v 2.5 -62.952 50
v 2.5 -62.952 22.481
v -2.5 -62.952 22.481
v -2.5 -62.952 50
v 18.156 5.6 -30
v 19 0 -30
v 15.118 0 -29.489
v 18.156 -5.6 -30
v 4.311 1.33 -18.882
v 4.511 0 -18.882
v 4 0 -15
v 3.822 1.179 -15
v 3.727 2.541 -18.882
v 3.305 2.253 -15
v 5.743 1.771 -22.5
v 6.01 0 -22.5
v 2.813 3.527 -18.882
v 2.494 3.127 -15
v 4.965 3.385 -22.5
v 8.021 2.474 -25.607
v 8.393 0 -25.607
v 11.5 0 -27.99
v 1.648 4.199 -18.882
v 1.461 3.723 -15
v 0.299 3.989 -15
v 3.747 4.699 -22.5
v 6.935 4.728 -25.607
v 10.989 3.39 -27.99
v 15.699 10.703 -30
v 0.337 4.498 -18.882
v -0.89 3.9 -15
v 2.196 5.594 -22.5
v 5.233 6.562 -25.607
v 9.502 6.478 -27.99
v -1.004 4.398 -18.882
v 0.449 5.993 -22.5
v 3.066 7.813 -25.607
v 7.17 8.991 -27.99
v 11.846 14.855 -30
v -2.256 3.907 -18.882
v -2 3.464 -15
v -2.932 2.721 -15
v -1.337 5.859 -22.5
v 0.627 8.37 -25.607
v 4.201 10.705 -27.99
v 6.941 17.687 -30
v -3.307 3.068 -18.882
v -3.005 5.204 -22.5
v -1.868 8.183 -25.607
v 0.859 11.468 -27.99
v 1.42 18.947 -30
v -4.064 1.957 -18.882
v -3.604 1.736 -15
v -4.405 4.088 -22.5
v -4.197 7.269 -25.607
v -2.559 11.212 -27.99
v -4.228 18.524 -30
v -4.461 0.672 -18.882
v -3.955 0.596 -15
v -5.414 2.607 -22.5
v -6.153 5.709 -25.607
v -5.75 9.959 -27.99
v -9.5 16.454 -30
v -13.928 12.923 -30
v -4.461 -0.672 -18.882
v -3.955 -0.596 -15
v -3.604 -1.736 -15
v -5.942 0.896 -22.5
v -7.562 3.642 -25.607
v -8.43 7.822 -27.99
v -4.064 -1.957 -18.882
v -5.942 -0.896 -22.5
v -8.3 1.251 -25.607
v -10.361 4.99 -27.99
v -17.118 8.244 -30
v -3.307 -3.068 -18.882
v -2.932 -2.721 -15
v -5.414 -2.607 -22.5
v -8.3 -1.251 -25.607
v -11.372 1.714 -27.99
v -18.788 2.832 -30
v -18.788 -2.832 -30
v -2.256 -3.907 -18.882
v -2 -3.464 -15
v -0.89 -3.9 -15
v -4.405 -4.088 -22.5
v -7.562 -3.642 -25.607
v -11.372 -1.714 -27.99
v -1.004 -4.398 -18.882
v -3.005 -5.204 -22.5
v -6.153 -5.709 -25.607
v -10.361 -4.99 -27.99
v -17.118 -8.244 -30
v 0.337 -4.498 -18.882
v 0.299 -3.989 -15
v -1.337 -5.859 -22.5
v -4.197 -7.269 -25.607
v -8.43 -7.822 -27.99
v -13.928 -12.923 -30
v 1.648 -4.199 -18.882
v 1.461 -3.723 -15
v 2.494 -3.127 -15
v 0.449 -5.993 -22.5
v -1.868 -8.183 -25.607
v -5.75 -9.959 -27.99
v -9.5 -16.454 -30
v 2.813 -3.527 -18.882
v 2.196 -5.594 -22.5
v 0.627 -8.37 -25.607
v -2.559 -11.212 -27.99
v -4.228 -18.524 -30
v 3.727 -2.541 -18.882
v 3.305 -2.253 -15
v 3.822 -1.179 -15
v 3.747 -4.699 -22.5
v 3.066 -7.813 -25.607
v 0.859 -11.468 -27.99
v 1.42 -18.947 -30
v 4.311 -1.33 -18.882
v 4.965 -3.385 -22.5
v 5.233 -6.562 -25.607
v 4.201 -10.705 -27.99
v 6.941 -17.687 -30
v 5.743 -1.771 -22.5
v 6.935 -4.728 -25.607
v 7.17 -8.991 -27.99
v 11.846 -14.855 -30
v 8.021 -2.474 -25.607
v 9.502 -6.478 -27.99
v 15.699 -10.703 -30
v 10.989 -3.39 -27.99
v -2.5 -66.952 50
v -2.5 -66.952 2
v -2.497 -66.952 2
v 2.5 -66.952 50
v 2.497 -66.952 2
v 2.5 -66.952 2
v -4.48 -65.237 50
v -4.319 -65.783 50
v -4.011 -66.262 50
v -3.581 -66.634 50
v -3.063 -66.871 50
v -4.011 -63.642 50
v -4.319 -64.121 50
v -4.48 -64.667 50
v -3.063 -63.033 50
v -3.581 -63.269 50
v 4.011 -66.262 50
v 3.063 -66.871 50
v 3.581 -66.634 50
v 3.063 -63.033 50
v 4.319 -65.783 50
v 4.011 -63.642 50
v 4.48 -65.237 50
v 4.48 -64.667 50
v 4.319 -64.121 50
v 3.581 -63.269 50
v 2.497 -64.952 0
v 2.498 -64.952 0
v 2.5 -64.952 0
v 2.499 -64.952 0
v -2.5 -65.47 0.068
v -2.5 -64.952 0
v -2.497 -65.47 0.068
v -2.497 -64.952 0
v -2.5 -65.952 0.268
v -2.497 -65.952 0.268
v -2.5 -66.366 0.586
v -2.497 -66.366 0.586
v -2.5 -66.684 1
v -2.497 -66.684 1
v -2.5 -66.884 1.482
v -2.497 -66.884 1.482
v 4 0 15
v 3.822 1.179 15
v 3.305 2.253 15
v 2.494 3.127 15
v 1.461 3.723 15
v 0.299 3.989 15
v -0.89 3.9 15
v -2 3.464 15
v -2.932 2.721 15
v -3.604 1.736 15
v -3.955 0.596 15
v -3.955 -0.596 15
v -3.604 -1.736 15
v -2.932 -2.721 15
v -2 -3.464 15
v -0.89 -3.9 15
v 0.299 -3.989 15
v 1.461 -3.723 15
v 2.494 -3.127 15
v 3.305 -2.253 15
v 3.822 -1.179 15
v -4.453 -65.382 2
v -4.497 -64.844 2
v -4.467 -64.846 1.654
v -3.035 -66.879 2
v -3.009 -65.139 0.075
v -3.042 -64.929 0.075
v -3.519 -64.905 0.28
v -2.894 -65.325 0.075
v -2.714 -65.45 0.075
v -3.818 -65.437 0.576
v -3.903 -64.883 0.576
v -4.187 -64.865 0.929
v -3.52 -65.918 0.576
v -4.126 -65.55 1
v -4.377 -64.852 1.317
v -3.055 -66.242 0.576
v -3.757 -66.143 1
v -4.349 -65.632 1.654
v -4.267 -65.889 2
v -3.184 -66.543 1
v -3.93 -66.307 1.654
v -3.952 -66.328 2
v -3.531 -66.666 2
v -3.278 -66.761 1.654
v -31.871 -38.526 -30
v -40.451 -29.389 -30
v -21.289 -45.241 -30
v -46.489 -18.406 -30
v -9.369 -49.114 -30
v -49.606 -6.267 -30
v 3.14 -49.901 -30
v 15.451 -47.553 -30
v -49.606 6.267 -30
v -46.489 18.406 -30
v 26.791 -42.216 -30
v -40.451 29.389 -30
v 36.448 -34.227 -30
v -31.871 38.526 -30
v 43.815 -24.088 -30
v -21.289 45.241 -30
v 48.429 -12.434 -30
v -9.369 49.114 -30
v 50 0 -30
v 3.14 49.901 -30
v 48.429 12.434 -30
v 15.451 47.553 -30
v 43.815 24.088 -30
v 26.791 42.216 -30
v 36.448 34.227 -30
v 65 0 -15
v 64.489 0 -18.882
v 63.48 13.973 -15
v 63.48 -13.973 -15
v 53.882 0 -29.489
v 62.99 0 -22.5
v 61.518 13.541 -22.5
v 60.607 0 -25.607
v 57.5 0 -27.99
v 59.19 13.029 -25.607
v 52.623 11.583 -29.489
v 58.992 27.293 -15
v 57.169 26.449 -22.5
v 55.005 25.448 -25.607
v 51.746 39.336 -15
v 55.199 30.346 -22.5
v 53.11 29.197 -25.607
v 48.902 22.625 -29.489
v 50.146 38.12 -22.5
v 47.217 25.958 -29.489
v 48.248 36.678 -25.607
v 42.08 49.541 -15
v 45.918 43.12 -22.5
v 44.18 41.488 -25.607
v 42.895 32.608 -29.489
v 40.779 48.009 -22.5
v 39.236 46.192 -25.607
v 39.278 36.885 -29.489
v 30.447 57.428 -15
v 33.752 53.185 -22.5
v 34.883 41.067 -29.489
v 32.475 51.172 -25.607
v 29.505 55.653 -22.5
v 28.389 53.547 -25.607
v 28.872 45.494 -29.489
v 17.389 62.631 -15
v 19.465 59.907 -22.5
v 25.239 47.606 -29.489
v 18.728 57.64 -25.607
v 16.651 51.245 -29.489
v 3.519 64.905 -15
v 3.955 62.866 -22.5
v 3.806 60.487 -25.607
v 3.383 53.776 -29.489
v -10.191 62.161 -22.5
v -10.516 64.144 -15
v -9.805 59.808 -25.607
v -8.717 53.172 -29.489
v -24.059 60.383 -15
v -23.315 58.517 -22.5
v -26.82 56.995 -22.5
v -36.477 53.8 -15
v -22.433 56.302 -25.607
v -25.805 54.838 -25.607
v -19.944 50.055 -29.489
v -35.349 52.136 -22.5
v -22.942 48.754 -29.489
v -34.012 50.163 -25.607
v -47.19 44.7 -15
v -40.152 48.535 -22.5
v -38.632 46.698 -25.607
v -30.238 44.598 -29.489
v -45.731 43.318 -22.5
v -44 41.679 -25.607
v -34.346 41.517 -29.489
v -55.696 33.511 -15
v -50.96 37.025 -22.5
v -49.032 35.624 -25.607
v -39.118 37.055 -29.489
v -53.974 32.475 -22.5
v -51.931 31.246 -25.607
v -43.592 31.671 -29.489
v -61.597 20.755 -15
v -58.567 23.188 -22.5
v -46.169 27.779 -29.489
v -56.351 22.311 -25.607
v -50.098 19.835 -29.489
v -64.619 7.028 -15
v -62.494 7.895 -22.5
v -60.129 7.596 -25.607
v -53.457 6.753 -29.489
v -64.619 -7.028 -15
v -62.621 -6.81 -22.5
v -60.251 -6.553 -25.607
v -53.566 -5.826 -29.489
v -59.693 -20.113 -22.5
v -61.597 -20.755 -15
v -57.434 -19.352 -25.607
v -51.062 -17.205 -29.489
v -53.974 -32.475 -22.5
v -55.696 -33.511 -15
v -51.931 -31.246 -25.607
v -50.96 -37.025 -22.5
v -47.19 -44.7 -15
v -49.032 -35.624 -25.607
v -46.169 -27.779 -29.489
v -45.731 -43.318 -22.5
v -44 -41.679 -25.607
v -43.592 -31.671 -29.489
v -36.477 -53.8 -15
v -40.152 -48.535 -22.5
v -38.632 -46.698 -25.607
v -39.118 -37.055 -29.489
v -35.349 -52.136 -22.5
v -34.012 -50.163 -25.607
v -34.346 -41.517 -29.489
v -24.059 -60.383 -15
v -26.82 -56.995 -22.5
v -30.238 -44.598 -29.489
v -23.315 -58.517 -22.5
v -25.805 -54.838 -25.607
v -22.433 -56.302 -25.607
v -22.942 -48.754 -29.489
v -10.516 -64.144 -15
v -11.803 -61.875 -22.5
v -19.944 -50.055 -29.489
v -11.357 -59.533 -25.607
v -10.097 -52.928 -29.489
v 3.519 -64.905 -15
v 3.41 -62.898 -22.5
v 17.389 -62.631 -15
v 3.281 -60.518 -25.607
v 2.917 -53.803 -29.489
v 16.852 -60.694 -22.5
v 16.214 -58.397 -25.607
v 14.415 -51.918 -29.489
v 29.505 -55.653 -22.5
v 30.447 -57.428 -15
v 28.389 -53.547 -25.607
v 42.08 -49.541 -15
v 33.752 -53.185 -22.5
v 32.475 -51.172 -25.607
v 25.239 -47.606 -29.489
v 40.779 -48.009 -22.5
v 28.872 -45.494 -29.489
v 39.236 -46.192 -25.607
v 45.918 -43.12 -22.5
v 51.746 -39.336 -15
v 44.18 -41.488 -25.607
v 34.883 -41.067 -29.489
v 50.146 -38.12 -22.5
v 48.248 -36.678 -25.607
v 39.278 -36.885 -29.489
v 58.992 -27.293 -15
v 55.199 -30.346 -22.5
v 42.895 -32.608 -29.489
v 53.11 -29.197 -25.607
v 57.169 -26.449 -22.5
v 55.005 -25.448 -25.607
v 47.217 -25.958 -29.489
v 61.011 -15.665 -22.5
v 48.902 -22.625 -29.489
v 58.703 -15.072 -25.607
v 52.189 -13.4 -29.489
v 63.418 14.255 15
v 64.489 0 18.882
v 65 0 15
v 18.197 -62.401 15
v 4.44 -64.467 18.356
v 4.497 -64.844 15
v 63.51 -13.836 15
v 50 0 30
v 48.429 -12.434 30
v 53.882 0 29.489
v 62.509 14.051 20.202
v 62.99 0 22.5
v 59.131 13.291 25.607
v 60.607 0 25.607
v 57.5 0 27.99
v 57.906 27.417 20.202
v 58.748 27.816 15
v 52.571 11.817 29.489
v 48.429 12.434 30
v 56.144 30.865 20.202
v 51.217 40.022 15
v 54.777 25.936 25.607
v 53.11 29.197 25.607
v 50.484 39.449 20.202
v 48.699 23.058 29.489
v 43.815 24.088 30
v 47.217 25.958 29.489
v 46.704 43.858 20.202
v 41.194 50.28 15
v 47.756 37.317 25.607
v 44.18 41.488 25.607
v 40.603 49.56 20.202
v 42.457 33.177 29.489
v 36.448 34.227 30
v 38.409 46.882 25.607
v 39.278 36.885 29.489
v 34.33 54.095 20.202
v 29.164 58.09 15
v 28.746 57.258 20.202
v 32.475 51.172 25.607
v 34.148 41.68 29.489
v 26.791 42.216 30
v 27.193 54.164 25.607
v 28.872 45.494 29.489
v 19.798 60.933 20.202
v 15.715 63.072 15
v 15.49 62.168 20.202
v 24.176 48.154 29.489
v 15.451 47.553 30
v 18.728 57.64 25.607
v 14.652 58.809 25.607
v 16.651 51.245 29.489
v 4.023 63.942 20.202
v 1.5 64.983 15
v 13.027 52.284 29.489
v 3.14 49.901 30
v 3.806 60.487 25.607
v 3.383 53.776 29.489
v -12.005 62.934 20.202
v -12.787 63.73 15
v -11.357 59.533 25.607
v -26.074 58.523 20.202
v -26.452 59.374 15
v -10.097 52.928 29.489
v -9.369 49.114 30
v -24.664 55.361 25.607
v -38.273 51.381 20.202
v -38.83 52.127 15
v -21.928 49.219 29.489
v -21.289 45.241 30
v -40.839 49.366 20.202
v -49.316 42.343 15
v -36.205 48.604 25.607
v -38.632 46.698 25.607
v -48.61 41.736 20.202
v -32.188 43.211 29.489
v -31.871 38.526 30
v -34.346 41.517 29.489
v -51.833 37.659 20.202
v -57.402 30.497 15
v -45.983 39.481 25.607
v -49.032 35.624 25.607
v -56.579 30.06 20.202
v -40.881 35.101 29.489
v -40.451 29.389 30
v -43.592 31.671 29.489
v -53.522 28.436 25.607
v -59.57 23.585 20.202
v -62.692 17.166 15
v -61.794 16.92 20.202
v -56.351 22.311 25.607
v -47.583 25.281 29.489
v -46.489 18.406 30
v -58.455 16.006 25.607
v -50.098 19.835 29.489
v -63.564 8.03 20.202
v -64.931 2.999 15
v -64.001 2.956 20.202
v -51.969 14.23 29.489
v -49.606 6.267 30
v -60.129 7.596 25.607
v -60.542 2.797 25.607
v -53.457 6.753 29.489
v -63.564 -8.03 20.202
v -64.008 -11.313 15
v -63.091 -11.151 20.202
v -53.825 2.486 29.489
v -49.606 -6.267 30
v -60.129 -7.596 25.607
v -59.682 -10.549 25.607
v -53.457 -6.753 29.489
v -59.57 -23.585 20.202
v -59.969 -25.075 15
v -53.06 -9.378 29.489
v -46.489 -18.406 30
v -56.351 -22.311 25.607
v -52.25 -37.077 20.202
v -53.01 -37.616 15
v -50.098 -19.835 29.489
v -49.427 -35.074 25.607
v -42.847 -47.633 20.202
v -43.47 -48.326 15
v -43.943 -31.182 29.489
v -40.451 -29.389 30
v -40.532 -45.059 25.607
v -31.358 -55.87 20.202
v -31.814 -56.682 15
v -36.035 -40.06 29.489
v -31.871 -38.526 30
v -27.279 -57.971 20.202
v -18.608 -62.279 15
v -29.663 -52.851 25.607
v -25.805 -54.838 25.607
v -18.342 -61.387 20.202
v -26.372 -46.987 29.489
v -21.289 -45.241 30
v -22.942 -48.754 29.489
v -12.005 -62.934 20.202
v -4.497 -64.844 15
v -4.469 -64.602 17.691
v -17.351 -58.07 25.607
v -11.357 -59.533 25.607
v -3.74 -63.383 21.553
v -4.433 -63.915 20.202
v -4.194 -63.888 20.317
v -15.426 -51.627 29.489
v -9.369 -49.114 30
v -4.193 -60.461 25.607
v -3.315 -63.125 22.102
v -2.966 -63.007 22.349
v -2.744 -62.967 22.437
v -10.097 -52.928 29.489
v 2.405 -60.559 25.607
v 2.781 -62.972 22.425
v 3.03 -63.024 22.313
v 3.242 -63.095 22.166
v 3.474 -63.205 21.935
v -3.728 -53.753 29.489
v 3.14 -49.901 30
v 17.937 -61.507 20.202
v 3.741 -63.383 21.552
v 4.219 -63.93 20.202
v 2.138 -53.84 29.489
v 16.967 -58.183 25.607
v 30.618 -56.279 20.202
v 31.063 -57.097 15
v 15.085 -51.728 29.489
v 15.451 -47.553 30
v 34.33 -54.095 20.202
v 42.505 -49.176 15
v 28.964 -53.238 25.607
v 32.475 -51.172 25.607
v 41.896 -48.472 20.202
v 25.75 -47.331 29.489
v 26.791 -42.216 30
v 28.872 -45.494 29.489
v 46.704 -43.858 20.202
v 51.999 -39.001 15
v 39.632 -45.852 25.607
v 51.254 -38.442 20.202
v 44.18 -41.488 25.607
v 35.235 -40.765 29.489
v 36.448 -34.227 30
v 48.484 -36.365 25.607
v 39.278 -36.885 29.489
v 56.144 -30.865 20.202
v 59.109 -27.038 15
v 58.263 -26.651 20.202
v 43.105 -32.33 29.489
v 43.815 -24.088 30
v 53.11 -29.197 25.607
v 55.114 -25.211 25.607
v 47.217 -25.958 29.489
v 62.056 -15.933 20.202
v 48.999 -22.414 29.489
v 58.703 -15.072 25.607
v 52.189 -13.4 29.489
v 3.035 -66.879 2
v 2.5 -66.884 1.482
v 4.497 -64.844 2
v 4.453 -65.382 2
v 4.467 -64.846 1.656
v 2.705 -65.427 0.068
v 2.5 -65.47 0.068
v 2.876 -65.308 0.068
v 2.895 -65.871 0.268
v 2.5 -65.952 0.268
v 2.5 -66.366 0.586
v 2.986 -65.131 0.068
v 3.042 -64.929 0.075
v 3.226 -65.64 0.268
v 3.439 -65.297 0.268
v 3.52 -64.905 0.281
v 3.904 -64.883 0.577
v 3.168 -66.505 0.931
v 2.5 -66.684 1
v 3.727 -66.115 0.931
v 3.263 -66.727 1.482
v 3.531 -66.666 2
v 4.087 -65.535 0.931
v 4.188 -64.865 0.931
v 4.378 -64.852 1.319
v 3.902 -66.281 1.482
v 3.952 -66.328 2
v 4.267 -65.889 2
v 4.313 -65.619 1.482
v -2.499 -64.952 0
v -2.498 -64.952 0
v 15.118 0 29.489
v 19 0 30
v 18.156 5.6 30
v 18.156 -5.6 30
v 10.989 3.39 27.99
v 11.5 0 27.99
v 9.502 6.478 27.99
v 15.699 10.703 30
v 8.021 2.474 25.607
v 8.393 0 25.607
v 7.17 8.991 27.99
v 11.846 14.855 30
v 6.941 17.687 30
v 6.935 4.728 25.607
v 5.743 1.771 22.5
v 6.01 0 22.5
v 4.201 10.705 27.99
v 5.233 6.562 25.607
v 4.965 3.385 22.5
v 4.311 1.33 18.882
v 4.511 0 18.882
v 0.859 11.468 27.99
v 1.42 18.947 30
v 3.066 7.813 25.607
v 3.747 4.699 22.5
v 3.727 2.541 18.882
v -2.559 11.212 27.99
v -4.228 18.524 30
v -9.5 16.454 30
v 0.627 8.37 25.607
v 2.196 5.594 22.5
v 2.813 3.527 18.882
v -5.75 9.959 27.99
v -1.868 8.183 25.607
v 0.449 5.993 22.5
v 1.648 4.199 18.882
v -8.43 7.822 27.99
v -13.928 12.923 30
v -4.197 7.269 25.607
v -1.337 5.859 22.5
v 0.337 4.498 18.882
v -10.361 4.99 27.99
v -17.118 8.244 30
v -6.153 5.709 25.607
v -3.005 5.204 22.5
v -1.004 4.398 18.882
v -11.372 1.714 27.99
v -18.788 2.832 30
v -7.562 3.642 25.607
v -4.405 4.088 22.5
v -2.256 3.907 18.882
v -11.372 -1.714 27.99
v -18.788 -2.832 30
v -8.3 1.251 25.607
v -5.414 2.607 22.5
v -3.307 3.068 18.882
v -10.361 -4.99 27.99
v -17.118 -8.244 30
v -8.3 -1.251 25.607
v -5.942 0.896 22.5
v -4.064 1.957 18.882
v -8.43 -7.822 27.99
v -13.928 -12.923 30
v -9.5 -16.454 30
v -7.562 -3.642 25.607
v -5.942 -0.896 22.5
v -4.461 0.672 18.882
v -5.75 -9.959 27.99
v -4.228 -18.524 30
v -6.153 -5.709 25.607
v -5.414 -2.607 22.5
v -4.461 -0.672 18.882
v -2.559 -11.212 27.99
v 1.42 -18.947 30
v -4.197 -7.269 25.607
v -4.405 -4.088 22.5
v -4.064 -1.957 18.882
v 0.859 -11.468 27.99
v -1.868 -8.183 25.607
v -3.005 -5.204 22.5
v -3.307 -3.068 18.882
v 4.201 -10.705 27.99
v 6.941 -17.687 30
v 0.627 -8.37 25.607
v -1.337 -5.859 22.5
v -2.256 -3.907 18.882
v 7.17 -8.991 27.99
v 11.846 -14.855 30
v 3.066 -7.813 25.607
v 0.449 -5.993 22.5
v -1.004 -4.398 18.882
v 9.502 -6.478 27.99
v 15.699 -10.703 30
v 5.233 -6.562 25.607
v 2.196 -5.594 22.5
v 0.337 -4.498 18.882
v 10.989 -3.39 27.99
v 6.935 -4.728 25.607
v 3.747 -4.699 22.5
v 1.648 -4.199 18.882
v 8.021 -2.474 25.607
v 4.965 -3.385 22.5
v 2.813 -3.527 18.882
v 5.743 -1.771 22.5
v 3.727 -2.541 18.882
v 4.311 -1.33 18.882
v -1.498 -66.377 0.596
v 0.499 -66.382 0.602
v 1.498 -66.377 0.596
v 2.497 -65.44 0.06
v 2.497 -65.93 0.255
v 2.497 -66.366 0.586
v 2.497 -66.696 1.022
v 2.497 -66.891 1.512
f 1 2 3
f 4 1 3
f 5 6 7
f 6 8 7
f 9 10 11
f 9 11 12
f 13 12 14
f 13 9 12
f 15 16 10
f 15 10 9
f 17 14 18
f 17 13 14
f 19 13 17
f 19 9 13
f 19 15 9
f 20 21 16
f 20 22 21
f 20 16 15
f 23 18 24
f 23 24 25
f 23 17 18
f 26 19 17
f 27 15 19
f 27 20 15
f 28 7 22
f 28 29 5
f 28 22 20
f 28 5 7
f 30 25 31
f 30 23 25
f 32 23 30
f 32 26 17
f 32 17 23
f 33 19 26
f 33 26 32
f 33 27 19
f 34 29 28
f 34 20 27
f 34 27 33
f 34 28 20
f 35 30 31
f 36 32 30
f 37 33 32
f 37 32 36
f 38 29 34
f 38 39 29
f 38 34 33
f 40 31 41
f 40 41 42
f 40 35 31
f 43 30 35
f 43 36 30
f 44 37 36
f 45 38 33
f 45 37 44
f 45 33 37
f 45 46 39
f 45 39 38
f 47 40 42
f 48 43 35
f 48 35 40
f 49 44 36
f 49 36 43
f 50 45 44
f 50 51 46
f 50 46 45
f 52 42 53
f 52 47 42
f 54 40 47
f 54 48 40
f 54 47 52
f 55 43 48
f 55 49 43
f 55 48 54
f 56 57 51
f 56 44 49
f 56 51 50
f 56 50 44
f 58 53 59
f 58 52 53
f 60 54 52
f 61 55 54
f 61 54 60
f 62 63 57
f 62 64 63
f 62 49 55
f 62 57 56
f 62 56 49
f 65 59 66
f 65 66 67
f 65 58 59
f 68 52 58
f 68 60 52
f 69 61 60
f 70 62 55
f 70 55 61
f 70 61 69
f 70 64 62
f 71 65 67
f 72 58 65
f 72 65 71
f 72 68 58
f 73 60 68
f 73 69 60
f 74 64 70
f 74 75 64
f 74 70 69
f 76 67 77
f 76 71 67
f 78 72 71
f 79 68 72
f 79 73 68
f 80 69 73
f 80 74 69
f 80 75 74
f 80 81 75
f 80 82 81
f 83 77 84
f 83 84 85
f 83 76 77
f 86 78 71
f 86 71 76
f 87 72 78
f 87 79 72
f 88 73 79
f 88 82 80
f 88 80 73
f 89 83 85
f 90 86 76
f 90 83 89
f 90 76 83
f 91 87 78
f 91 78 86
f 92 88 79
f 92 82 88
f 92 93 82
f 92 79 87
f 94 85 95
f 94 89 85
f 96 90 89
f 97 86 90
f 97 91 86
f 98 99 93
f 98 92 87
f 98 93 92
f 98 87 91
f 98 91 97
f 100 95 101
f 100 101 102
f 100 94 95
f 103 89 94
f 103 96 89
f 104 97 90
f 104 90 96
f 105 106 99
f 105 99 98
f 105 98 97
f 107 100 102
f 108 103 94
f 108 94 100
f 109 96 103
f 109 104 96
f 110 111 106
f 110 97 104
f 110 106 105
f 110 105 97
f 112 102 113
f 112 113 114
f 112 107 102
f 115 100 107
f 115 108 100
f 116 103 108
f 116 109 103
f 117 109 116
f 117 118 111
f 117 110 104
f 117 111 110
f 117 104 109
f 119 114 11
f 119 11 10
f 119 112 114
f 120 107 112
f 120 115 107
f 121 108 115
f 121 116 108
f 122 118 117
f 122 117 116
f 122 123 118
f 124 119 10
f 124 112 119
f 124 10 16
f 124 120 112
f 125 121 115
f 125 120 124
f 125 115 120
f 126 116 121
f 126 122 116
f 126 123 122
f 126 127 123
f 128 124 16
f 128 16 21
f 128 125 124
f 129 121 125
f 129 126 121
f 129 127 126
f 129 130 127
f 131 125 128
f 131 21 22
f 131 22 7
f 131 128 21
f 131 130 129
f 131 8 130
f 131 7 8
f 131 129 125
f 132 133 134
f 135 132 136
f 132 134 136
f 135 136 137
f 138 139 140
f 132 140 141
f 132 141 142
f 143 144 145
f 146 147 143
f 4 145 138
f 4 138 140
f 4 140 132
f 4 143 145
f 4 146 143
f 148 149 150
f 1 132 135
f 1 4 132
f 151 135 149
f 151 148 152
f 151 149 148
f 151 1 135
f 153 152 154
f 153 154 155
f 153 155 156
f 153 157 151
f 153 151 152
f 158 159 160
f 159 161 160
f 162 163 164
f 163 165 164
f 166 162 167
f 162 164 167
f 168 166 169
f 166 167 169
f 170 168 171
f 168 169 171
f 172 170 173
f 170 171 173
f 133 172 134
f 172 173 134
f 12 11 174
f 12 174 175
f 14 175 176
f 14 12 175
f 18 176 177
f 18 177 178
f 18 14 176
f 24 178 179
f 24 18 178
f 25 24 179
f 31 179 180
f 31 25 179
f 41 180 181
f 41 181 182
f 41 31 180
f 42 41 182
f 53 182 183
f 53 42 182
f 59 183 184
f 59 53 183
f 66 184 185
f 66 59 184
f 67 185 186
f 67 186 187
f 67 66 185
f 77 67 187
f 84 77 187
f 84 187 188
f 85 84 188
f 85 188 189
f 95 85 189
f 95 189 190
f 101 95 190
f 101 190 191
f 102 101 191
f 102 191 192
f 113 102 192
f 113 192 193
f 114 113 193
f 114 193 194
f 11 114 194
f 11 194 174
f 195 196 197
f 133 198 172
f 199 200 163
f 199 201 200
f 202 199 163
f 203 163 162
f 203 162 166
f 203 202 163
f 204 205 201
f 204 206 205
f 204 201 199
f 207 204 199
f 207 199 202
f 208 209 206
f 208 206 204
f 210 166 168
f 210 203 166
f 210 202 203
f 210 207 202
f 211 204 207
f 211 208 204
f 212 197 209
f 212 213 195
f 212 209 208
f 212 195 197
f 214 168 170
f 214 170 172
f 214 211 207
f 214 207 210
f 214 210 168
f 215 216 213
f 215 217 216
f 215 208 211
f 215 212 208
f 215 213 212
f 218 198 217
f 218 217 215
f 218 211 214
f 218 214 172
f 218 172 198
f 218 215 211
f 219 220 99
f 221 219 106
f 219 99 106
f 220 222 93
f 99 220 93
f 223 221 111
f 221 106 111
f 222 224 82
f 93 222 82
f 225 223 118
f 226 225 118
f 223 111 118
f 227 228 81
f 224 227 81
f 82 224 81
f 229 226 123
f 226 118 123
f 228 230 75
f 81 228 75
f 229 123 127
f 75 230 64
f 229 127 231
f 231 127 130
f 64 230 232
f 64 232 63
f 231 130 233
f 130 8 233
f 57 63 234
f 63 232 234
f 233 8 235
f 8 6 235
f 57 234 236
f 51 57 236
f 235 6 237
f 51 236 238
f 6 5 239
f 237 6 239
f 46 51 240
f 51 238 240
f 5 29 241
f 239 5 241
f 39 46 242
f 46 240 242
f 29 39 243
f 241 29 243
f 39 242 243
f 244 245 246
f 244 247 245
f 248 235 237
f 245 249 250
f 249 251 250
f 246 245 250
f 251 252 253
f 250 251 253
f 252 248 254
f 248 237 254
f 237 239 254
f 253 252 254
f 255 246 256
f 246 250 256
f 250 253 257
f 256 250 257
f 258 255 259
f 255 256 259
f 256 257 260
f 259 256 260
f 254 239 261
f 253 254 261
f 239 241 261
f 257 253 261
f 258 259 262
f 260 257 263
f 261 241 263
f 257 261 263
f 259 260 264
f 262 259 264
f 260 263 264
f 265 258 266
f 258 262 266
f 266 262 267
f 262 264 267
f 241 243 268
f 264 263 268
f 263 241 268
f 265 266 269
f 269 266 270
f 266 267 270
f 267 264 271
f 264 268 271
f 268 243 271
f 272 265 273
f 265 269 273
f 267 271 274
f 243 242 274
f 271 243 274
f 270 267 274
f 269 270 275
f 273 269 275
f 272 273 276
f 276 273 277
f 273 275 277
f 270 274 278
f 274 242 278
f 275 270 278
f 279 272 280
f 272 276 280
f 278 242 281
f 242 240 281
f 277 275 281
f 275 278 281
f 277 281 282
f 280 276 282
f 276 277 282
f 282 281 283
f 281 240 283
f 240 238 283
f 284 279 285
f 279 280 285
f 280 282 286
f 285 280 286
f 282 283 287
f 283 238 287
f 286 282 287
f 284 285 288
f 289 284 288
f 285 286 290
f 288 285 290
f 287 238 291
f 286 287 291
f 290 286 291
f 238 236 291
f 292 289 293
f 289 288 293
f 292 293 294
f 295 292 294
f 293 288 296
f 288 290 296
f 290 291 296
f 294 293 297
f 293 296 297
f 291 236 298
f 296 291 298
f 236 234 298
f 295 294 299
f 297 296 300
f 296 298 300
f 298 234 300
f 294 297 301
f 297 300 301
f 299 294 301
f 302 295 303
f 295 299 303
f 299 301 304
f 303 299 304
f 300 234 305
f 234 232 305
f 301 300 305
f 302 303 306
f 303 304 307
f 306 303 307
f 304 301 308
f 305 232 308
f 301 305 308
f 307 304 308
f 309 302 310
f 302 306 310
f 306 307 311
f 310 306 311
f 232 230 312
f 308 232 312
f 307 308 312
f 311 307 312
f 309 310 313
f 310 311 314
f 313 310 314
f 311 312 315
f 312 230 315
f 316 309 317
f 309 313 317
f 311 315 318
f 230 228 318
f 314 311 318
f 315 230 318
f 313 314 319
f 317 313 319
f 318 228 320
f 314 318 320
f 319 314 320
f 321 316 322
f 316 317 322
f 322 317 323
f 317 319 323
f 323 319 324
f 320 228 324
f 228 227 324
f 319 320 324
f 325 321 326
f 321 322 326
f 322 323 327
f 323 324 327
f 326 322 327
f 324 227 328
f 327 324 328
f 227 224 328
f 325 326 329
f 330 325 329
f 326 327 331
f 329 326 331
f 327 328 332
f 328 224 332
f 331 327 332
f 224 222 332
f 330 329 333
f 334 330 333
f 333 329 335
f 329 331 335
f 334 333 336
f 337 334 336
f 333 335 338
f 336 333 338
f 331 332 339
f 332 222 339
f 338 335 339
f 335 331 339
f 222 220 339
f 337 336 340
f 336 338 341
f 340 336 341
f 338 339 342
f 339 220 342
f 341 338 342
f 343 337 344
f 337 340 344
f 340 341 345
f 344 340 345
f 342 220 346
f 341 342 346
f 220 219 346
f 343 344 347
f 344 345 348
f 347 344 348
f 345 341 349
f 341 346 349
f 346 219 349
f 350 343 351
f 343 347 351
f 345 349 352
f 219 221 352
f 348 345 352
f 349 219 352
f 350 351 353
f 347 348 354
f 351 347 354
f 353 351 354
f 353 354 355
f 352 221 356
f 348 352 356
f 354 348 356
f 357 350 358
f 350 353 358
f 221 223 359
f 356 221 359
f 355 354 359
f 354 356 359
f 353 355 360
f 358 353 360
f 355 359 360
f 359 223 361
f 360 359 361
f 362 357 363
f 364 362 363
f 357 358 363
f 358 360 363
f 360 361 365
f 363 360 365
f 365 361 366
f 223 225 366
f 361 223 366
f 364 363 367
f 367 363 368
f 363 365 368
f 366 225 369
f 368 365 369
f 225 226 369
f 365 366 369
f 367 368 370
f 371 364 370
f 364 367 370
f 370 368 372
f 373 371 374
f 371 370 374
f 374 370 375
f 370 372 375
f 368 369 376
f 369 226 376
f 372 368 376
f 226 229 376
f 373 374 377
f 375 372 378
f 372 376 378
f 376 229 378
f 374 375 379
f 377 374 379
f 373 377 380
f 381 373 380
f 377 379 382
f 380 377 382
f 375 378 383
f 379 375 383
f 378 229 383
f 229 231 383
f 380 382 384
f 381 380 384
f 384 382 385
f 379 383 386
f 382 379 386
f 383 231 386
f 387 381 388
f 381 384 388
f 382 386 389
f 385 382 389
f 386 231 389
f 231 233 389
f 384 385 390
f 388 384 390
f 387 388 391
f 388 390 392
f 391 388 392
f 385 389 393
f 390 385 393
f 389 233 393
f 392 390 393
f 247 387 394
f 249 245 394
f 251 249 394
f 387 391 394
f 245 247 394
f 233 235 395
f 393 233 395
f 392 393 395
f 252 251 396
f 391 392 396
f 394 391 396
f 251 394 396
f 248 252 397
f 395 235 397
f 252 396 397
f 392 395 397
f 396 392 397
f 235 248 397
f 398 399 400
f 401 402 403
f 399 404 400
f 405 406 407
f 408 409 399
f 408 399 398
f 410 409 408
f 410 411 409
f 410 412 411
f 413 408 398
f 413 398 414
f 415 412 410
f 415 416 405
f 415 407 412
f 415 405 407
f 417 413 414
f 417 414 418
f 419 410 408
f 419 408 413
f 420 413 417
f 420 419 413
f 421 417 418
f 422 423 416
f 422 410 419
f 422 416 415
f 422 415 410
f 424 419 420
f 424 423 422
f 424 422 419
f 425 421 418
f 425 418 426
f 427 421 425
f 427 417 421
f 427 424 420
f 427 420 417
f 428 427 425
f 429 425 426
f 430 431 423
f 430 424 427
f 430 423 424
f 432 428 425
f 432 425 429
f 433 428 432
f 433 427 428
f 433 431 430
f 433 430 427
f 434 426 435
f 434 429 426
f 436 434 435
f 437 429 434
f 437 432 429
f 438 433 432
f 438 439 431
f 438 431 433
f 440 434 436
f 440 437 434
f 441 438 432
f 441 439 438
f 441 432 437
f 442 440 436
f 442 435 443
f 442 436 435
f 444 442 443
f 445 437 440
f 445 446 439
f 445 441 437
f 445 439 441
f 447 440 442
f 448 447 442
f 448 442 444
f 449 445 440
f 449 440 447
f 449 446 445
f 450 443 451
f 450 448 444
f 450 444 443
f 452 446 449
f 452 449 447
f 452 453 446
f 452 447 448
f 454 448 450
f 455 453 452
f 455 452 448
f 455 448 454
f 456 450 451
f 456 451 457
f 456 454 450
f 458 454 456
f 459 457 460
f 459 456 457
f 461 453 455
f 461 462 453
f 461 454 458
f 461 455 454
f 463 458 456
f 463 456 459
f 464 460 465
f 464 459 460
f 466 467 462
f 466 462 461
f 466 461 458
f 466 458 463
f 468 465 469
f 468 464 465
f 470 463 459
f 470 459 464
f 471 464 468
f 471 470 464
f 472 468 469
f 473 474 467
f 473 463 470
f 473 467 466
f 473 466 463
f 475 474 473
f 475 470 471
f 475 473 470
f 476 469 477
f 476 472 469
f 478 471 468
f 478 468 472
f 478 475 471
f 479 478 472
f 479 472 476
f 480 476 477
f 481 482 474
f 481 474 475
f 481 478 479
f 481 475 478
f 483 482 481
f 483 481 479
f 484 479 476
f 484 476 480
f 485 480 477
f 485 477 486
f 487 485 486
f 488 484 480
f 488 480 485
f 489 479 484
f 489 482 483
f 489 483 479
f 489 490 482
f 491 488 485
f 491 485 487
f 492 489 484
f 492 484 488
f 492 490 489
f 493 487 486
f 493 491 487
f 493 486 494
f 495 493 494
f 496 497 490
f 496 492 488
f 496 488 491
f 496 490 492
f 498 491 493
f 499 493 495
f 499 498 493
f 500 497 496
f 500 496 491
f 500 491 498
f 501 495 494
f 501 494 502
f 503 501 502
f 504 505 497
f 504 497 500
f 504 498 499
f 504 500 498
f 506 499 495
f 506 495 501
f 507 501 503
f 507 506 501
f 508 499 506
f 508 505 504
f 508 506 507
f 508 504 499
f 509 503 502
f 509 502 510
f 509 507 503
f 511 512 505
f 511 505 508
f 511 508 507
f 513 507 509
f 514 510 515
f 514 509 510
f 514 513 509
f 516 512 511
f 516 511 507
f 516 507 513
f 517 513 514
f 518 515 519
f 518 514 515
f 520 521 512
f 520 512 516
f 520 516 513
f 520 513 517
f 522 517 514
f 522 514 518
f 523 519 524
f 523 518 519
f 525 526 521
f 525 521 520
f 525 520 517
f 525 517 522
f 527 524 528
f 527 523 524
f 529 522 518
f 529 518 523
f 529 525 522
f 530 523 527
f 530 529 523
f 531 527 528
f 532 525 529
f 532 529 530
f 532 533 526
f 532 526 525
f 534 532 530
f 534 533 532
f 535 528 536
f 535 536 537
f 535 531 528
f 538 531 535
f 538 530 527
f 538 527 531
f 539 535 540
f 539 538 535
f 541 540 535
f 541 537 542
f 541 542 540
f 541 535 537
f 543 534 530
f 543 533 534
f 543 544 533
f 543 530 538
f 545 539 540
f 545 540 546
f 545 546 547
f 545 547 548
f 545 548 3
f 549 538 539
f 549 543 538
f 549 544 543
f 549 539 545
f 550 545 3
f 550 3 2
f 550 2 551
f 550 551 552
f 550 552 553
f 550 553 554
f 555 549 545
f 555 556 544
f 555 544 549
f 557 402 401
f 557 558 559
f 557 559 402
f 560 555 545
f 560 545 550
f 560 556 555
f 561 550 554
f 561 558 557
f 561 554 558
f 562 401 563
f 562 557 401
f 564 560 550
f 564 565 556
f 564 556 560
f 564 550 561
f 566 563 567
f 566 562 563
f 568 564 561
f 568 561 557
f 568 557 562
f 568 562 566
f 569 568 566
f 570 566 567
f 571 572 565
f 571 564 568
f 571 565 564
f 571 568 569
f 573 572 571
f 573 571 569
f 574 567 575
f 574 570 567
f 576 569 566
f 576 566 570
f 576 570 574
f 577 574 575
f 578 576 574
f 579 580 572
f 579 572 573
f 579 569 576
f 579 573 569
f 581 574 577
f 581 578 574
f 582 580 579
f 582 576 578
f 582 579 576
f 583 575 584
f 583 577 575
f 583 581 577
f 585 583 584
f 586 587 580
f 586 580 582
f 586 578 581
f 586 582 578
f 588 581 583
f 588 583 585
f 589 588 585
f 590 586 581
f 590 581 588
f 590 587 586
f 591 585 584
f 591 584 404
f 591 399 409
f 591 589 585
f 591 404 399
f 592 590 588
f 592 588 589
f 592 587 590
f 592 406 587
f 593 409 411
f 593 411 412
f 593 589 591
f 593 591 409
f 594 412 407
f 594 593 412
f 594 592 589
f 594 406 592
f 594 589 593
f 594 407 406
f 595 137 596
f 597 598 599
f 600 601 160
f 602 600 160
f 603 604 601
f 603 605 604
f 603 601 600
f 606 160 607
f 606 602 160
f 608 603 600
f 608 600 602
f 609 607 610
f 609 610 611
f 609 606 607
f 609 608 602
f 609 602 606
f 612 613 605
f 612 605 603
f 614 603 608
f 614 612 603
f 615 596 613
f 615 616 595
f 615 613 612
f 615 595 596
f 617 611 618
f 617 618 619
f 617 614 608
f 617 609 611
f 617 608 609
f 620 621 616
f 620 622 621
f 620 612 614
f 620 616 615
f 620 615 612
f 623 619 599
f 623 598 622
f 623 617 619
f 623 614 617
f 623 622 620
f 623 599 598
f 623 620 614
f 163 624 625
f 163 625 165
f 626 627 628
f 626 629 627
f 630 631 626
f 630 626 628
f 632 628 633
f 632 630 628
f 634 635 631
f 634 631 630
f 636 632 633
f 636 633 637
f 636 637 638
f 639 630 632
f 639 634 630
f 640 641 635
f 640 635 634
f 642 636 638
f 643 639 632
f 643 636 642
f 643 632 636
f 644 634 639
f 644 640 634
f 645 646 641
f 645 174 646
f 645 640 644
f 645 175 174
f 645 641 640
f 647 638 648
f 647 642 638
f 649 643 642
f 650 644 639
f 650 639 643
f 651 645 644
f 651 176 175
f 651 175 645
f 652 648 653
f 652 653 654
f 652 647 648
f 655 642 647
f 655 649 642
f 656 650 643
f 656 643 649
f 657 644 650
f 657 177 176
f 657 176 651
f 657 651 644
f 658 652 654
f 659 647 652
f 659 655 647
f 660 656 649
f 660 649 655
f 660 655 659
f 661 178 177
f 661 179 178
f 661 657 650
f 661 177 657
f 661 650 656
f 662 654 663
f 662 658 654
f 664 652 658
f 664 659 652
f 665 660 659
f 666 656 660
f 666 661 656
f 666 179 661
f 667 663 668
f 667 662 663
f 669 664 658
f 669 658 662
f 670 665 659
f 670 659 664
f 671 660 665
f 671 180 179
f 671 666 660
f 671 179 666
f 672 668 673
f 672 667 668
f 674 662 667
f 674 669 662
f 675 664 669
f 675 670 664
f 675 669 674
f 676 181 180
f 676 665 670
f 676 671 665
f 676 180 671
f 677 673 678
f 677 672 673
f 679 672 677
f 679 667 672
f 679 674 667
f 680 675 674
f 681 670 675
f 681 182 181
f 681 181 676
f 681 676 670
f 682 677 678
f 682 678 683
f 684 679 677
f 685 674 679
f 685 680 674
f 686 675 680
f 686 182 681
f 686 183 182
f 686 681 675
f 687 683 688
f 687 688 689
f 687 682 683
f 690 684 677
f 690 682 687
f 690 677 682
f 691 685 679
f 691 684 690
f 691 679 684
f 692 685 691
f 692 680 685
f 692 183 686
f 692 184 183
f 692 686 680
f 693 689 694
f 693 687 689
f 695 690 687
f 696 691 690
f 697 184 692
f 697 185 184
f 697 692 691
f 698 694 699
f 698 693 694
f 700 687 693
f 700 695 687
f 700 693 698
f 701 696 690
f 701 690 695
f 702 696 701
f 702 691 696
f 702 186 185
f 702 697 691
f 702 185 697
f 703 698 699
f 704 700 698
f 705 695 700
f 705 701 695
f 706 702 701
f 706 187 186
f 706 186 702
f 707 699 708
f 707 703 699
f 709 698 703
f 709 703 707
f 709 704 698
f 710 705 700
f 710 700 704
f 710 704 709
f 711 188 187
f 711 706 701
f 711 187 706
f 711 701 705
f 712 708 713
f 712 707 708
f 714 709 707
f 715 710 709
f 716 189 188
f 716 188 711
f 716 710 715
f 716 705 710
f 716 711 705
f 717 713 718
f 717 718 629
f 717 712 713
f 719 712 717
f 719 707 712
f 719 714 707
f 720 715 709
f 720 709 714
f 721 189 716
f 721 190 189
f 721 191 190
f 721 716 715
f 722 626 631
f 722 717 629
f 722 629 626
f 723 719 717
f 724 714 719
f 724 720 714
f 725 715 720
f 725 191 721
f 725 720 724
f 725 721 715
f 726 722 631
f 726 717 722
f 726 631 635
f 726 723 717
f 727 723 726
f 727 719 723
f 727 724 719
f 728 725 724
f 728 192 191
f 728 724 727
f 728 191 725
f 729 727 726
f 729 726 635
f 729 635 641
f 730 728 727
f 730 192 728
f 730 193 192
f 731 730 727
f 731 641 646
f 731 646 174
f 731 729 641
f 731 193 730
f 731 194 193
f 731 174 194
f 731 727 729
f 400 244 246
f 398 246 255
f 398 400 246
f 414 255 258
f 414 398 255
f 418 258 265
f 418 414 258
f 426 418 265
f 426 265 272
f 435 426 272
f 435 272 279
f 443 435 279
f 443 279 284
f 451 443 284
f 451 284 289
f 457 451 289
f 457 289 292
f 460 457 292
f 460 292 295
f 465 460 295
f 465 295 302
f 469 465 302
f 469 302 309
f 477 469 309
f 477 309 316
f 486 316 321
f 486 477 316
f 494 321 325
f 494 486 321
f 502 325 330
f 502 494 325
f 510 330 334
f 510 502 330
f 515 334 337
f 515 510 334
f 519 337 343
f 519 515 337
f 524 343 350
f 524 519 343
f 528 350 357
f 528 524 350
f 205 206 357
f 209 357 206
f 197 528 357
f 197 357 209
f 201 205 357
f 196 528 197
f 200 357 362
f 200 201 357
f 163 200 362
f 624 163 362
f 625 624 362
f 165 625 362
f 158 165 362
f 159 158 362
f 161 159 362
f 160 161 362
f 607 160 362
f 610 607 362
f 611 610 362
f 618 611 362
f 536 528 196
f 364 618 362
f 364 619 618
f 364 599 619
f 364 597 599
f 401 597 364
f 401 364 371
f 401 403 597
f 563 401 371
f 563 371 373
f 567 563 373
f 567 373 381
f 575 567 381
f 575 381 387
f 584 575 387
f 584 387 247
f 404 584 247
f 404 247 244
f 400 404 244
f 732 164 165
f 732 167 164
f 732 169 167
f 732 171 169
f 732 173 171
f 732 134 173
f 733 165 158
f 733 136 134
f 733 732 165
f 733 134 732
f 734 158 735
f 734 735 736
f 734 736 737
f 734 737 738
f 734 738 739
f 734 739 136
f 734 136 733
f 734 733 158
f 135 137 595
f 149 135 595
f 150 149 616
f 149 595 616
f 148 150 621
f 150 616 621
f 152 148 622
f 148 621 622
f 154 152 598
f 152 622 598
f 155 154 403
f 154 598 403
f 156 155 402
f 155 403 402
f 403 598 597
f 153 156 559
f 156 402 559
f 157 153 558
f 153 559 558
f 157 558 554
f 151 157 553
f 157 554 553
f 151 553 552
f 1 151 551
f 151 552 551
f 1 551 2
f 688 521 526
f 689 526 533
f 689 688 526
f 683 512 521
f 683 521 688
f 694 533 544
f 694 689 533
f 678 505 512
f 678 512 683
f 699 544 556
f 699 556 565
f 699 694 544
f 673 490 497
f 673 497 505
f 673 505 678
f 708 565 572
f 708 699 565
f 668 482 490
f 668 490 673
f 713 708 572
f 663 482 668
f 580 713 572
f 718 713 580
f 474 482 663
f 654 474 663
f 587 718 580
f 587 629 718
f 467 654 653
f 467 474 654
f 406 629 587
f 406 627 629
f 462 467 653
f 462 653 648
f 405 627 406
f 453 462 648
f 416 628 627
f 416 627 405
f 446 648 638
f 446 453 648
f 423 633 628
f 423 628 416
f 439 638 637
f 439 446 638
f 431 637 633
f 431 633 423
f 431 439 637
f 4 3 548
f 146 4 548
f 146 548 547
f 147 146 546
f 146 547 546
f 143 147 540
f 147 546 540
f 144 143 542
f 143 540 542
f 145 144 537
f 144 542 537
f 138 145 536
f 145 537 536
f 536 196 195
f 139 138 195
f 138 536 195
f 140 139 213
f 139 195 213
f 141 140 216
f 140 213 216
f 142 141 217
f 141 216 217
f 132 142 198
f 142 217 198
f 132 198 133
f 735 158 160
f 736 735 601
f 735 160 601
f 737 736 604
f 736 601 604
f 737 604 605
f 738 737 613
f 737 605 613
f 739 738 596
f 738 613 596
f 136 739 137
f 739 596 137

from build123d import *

# Parameters (mm, degrees)
F0_R     = 65
F0_R_2   = 4
F1_DEPTH = 30
F2_R     = 15
F4_DEPTH = 50
F5_R     = 1.9999


# Not quite as in the source:
# - a fillet or chamfer is up to 0.001 mm smaller than in the source, because OpenCascade refuses the exact size


with BuildPart() as f1:
    # F0 (on Top) → F1 (new body, symmetric)
    with BuildSketch(Plane.XY):
        Circle(F0_R)
        Circle(F0_R_2, mode=Mode.SUBTRACT)
    extrude(amount=F1_DEPTH, both=True)

    # F2
    f2_edges = [f1.edges().sort_by_distance(p)[0] for p in [
        (-4, 0, 30),
        (4, 0, 0),
        (-4, 0, -30),
        (-65, 0, -30),
        (65, 0, 0),
        (-65, 0, 30),
    ]]
    fillet(f2_edges, radius=F2_R)

    # F3 (on Top) → F4 (join)
    with BuildSketch(Plane.XY):
        with BuildLine():
            Line((2.5, -62.9519052838), (-2.5, -62.9519052838))
            ThreePointArc((-2.5, -62.9519052838), (-4.5, -64.9519052838), (-2.5, -66.9519052838))
            Line((-2.5, -66.9519052838), (2.5, -66.9519052838))
            ThreePointArc((2.5, -66.9519052838), (4.5, -64.9519052838), (2.5, -62.9519052838))
        make_face()
    extrude(amount=F4_DEPTH)

    # F5 (radius 2 in the source; OpenCascade refuses exactly that, so slightly less here)
    f5_edges = [f1.edges().sort_by_distance(p)[0] for p in [
        (0, -66.951905, 0),
    ]]
    fillet(f5_edges, radius=F5_R)


solid = f1.part
